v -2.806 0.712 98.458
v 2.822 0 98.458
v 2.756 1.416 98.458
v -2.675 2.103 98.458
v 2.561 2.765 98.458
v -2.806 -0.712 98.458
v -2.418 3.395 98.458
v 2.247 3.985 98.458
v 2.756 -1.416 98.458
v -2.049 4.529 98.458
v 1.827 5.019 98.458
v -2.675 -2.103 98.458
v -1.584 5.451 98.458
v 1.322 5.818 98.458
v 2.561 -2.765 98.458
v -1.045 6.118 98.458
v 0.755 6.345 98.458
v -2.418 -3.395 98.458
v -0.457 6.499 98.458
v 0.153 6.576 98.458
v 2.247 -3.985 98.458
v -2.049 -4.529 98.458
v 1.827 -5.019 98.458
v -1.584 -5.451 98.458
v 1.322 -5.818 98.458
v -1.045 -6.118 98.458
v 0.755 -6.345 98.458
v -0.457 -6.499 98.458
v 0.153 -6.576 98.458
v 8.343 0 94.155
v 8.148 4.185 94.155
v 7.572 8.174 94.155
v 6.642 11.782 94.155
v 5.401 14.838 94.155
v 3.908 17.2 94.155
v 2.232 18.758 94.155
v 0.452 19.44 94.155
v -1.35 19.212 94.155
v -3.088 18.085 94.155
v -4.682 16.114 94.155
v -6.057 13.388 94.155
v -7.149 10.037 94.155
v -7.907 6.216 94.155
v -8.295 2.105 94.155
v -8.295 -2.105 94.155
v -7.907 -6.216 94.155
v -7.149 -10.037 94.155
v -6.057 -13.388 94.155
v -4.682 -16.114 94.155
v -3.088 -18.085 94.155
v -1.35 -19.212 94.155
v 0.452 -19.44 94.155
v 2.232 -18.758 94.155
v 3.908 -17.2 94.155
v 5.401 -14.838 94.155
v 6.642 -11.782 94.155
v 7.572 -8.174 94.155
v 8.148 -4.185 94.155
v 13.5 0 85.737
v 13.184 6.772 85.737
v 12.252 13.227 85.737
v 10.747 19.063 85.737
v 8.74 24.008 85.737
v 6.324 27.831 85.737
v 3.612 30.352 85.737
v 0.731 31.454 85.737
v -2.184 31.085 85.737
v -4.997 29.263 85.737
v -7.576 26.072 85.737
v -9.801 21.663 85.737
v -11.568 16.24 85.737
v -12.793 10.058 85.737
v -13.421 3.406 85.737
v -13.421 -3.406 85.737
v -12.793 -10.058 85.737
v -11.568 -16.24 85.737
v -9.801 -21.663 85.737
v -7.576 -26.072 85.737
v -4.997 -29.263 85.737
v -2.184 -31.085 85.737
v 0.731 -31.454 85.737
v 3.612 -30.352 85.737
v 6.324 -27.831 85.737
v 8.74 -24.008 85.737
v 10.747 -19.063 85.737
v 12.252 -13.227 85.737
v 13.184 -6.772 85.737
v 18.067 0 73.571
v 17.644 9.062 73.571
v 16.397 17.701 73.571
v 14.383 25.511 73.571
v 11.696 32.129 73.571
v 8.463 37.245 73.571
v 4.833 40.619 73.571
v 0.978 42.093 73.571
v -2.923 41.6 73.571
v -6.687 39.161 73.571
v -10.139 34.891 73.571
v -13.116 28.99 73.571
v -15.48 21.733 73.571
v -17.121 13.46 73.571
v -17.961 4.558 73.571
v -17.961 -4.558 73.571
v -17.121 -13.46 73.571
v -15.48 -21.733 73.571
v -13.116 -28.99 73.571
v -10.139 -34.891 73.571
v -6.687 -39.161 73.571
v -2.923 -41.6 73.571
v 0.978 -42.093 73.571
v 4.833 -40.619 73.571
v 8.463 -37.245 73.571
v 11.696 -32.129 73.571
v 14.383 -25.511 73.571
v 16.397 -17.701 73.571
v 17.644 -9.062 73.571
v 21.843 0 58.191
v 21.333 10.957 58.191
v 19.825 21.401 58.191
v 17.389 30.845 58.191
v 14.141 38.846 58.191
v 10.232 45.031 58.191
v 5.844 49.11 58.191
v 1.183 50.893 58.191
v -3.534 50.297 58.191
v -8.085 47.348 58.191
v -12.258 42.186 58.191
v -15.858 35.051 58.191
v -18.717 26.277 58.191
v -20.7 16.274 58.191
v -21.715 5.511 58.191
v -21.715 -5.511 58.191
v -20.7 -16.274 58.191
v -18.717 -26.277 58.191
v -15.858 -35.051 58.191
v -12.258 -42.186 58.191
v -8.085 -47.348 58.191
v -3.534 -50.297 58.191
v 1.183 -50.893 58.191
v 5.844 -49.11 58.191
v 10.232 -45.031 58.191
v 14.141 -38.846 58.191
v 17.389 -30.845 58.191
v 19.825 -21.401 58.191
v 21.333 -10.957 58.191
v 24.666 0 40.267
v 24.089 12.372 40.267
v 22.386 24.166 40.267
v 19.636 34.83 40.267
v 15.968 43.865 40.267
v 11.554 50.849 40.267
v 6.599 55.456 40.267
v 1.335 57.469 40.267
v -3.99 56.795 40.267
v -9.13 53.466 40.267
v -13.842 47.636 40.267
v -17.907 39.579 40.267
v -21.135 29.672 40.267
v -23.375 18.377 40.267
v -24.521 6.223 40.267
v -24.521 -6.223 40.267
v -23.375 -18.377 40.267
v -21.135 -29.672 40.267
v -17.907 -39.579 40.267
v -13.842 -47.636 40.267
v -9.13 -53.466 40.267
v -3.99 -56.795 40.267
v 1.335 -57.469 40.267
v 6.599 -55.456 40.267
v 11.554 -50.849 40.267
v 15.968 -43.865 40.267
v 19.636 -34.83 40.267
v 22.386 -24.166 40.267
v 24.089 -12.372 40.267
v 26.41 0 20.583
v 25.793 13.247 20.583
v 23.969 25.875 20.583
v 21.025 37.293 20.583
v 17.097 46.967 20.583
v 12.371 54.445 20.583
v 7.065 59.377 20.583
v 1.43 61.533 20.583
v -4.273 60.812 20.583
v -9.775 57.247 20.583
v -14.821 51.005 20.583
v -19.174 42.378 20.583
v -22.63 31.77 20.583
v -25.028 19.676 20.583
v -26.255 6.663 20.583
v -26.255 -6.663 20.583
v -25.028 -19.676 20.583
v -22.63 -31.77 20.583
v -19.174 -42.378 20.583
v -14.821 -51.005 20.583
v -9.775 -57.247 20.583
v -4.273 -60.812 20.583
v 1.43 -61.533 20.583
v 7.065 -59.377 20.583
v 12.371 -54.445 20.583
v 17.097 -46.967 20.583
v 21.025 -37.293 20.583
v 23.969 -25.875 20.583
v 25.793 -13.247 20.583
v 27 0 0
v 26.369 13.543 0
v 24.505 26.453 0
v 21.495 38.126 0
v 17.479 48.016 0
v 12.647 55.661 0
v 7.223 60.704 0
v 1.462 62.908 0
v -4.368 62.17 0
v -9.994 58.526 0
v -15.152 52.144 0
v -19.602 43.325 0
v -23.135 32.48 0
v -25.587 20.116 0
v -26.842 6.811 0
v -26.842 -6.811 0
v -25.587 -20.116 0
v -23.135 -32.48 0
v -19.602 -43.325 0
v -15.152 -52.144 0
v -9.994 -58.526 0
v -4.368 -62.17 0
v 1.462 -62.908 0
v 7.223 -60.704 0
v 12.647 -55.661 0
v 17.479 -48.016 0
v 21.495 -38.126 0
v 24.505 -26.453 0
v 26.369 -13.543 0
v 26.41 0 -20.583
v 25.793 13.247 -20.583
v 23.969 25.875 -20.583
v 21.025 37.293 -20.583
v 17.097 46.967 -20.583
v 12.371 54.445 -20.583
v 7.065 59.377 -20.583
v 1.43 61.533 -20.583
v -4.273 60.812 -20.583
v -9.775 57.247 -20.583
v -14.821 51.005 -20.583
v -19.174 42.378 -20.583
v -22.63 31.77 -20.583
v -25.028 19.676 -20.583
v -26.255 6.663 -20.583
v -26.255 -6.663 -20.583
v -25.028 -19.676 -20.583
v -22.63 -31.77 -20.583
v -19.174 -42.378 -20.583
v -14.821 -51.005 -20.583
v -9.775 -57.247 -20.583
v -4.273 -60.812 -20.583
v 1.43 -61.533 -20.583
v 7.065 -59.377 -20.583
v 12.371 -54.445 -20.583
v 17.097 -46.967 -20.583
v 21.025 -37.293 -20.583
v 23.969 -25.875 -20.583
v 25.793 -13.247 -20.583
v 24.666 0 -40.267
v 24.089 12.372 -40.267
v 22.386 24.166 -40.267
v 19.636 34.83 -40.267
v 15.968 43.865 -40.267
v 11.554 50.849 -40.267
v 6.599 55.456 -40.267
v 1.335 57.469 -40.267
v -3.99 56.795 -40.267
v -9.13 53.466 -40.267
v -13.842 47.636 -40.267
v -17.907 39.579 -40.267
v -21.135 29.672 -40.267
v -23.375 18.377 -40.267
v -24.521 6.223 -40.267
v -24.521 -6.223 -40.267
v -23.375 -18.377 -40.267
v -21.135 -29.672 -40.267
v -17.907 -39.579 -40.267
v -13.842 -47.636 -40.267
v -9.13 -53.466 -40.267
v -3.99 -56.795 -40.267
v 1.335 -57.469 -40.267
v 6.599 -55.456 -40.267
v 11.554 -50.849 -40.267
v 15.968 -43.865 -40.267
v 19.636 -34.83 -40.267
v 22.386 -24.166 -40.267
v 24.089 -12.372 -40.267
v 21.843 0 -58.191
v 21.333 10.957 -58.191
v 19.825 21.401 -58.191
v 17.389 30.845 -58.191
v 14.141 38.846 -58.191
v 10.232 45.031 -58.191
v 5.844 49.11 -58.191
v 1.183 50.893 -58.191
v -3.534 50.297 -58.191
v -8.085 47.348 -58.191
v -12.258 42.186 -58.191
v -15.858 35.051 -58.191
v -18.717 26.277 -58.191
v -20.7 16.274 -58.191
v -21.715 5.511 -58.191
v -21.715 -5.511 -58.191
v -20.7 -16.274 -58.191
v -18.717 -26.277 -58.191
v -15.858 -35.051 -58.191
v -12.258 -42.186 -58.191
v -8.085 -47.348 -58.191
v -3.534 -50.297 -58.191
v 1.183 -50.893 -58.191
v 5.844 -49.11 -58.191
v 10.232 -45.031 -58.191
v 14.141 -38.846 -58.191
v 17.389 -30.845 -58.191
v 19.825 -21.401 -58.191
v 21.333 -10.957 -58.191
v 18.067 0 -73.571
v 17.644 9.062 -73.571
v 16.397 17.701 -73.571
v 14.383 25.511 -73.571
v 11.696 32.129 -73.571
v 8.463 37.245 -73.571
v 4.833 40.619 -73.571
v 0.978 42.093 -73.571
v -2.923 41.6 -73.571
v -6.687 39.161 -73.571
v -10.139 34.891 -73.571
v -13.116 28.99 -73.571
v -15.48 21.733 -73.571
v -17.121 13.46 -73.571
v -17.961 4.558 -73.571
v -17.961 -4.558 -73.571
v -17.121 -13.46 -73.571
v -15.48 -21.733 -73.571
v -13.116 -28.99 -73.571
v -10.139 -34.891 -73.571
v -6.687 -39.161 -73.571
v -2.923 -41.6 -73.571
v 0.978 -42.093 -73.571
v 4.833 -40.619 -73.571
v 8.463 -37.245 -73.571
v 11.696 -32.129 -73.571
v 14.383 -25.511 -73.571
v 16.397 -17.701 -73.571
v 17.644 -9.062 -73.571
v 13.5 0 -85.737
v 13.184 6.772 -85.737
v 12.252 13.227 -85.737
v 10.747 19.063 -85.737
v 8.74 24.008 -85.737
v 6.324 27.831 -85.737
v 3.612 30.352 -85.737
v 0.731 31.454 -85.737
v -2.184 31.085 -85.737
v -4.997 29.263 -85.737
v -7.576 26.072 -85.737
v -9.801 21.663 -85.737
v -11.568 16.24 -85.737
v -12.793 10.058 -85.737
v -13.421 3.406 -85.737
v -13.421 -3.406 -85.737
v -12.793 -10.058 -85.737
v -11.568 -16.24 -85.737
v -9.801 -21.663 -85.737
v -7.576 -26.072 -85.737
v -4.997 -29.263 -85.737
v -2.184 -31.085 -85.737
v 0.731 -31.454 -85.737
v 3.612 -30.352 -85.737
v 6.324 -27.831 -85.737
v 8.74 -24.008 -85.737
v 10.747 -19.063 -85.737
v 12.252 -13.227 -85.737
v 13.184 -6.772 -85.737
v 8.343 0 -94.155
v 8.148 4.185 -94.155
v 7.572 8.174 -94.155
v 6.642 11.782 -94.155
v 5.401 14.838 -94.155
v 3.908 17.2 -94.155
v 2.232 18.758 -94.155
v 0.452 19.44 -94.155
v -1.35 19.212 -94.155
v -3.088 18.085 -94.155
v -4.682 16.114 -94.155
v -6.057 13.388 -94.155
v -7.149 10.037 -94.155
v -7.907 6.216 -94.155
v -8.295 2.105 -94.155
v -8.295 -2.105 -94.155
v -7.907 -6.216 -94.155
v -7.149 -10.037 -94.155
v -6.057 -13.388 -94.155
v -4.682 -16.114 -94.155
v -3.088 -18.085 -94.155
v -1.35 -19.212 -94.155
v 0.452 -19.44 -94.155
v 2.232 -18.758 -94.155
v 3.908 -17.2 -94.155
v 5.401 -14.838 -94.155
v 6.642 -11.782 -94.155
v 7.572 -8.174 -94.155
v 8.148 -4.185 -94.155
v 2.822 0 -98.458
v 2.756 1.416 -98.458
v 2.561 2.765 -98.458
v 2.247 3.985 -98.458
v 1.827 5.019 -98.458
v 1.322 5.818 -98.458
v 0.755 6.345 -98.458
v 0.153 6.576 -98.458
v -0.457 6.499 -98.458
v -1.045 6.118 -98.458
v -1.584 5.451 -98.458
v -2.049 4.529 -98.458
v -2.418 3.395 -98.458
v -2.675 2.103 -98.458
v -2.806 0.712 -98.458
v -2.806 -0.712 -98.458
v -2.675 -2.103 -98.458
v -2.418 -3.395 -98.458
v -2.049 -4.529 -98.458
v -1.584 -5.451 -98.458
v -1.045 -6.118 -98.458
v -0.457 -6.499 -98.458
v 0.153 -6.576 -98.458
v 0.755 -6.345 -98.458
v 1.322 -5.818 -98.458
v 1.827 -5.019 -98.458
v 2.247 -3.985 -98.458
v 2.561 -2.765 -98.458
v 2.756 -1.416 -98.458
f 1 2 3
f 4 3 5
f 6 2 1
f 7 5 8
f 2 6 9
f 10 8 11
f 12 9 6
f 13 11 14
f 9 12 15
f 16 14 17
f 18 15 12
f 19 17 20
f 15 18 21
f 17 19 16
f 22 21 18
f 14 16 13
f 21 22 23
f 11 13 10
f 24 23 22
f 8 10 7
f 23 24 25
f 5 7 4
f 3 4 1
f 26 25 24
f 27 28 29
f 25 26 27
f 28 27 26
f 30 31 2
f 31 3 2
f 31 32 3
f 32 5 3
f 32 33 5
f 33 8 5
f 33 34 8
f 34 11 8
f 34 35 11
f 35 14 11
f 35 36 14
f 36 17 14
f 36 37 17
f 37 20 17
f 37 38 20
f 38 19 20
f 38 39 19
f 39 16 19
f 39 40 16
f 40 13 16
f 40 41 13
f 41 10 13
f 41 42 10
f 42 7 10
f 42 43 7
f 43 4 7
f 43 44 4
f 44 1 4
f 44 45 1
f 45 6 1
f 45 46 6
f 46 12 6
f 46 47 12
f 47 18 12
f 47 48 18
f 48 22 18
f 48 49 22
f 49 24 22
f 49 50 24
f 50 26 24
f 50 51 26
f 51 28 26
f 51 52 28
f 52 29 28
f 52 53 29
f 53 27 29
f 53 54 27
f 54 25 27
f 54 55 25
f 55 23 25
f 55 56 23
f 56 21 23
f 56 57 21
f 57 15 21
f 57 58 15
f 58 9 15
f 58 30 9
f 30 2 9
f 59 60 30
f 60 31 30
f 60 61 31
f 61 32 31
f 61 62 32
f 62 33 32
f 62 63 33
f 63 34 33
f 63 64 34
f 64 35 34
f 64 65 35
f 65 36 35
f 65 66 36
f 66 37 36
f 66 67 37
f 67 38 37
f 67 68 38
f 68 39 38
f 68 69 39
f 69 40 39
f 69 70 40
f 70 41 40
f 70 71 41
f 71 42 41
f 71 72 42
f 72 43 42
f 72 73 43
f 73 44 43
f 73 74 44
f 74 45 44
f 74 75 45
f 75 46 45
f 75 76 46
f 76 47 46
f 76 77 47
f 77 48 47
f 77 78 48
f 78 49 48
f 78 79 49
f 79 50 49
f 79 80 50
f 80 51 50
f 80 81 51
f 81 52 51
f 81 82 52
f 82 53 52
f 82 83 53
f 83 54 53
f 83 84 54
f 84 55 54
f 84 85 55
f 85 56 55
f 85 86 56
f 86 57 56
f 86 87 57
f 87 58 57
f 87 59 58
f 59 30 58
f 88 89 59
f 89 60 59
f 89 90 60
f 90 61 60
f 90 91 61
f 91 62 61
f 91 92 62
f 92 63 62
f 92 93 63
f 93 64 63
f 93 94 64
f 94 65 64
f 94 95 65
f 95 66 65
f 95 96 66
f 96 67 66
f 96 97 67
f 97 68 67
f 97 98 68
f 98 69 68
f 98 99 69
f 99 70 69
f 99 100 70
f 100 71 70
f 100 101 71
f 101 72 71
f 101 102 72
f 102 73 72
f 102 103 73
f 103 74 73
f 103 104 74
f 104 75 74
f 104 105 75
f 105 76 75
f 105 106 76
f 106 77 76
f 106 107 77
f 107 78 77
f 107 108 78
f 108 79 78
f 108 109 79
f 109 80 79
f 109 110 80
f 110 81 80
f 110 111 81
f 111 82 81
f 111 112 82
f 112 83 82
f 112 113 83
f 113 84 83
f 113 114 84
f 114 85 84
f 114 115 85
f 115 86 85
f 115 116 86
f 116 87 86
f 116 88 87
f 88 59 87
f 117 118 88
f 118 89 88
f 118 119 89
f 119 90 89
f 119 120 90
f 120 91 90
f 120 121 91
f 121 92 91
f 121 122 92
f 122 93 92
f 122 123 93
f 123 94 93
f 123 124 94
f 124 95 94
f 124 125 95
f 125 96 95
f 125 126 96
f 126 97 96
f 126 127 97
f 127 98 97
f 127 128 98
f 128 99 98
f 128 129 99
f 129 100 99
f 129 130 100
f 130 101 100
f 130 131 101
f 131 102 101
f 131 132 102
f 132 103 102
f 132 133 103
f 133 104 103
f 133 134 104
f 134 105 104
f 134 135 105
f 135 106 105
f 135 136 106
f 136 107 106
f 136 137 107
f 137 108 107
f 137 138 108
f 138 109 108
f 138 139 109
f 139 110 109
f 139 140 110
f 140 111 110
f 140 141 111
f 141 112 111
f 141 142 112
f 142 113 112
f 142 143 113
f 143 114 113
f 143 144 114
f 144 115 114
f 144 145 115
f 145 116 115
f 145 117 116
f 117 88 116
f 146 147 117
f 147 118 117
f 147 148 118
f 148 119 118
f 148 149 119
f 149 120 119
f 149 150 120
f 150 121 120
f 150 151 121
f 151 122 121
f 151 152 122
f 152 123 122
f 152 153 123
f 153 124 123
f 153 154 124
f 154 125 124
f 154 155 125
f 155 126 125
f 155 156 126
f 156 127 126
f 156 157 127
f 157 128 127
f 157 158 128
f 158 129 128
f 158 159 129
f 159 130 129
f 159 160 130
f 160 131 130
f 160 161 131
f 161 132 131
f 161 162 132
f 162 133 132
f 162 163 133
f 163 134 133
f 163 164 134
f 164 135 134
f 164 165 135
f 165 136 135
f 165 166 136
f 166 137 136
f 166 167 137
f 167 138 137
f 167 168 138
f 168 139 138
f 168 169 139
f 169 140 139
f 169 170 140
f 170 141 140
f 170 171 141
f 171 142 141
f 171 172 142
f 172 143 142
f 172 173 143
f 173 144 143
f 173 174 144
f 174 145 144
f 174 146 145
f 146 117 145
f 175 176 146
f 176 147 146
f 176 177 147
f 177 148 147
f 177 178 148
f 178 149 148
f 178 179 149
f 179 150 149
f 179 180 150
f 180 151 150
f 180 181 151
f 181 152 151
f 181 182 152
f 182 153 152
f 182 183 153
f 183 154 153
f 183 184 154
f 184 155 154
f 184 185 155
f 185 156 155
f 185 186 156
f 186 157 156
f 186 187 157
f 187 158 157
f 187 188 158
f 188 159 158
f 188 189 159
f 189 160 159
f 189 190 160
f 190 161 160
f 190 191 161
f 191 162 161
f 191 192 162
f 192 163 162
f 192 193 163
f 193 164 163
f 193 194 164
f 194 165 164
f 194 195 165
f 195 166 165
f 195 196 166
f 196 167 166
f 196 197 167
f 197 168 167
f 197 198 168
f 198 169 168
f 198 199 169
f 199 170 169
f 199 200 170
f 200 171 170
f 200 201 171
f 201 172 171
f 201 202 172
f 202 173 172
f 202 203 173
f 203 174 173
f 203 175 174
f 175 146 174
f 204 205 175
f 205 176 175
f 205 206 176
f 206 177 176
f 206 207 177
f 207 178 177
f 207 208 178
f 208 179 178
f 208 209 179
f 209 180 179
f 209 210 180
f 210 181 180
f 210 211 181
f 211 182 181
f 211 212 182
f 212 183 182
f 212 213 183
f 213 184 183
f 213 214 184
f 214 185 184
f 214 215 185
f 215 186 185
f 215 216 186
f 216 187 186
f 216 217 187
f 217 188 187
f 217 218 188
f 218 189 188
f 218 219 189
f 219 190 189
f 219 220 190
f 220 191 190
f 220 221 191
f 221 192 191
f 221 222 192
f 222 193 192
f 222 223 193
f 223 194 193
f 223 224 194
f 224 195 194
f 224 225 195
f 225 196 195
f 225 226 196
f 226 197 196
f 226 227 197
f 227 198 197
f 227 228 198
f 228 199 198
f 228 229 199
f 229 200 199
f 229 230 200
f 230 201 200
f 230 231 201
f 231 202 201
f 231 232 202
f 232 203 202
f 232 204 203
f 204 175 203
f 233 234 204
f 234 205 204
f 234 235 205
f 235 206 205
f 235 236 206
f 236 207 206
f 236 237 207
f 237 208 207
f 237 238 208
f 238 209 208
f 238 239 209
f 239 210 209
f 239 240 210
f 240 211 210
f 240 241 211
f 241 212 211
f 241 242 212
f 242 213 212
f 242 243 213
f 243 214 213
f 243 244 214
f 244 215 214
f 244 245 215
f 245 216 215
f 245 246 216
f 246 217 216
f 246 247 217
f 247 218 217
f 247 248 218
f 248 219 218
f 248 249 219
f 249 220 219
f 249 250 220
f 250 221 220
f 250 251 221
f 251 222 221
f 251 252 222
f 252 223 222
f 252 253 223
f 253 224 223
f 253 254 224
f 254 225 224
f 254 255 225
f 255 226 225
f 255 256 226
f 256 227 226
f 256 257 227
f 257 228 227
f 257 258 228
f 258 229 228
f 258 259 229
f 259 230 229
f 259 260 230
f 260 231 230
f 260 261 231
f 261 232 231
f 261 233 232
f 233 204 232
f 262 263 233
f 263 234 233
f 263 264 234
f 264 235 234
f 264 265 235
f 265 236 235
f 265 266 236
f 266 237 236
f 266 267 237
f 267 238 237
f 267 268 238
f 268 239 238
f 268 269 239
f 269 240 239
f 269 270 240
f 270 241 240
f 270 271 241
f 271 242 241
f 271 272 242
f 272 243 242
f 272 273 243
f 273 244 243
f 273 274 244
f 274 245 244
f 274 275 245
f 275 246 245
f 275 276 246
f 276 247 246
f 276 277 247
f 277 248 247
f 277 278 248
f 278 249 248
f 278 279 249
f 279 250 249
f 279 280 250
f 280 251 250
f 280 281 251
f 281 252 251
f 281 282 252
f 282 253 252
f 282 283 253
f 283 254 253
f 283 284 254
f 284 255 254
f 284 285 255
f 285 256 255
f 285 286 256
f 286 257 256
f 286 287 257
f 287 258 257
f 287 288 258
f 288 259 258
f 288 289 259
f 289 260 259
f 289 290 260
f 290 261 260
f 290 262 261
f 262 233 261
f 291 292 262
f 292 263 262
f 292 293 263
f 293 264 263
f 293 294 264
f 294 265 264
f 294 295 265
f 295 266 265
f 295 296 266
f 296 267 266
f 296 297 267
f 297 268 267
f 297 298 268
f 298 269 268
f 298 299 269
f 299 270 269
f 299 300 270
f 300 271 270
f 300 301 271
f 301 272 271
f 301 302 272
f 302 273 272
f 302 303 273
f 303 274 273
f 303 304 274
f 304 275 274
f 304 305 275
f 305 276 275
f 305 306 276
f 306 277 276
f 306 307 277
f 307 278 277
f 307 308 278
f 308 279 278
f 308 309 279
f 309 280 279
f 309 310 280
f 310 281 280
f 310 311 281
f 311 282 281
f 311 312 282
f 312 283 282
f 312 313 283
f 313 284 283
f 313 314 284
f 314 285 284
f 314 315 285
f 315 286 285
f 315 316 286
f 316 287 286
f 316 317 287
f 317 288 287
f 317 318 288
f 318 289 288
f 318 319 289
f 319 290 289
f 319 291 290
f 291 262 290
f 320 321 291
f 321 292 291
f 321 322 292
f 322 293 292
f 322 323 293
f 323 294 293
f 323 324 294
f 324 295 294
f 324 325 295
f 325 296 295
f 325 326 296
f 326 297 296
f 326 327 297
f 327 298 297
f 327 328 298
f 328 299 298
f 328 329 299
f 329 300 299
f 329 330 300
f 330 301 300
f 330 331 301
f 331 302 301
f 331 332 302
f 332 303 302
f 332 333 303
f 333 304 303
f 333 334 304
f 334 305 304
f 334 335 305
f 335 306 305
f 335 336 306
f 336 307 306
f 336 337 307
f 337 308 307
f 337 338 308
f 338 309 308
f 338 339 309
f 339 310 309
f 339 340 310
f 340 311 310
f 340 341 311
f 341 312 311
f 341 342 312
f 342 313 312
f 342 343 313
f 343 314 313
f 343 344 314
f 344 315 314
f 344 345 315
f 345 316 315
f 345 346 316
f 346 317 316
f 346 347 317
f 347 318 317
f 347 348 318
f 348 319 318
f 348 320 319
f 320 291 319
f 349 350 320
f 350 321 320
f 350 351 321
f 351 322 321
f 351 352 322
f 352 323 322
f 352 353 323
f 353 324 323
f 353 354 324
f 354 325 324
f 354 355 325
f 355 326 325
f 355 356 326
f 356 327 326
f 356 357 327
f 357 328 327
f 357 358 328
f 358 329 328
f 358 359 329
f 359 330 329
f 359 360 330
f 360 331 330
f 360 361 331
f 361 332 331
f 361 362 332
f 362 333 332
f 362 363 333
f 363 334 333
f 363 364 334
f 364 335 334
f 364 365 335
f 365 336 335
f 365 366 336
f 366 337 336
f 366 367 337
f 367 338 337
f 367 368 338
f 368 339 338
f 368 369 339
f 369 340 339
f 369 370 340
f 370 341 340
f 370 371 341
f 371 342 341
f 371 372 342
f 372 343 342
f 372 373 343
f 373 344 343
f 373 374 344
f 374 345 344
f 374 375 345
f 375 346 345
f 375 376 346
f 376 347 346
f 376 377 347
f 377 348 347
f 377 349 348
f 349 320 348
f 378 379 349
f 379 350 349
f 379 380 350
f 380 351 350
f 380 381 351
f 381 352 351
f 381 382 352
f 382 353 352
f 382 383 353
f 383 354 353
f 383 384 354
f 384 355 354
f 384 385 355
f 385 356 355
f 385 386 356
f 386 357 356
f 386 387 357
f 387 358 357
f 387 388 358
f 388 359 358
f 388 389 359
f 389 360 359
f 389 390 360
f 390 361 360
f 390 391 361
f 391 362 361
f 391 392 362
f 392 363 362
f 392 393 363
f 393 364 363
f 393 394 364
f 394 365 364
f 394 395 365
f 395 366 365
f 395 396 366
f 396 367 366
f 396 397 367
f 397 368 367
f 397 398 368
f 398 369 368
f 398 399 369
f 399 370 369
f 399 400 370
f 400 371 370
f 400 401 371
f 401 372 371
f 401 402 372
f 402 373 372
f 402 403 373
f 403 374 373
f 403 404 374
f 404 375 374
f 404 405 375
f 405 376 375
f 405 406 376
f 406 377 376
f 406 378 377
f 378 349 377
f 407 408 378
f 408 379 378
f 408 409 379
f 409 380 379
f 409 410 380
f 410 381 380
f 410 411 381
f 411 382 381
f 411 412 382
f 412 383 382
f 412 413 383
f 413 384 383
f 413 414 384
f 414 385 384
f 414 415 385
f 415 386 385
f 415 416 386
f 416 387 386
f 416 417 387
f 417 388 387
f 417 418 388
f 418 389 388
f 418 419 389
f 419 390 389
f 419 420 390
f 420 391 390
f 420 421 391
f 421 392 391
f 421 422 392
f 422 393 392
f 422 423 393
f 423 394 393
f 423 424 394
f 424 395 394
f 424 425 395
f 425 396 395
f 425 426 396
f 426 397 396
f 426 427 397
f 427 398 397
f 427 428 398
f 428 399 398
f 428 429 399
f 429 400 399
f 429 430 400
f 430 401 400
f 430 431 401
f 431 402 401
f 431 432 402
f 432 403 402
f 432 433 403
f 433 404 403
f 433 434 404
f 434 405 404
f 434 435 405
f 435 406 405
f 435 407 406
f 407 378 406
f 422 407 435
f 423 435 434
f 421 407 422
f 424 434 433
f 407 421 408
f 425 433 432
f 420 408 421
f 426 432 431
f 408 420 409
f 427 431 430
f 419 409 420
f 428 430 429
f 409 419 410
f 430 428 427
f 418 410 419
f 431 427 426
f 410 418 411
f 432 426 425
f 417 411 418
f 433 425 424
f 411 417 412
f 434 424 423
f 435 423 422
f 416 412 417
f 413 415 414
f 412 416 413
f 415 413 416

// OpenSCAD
// Generated by SolidPython 1.0.1 on 2020-07-29 00:46:45


scale(v = [3, 7, 11]) {
	sphere(r = 9);
}
/***********************************************
*********      SolidPython code:      **********
************************************************
 
# import packages: SolidPython
from solid import *
from solid.utils import *
from itertools import chain, combinations, permutations


class Resize:

    def __init__(self, scad_file):
        self.scad_file = scad_file
        #self.scad_file = import_scad(scad_file)
        # cone/cylinder param:
        self.r1 = 0
        self.r2 = 0
        self.h = 0
        # rectangular prism param:
        self.w = 0
        self.l = 0
        # ellipse param:
        self.r = 0

    # import OpenScad code (file name corresponds to shape)


    # classify shape + parameters
    def assign(self, param1, param2, param3):
        if self.scad_file == 'cone.scad':
            self.r1 = param1
            self.r2 = param2
            self.h = param3
        elif self.scad_file == 'cylinder.scad':
            self.r1 = param1
            self.r2 = param2
            self.h = param3
        elif self.scad_file == 'rectangularPrism.scad':
            self.h = param1
            self.l = param2
            self.w = param3
        else:
            self.r = param1
            self.h = param2

    # resize parameters
    def iterate(self):
        x = range(3, 20, 2)
        i = 1
        if self.scad_file == 'cone.scad':
            tempList = list(permutations(x, 2))
            for temp in tempList:
                param1 = temp[0]
                param2 = temp[1]
                filepath = 'produced_scad_files/' + 'cone' + str(param1) + '_' + str(param2) + '_' + '.scad'
                scad_render_to_file(cylinder(h=param1, r1=param2, r2=0), filepath)

        elif self.scad_file == 'cylinder.scad':
            tempList = list(permutations(x, 3))
            for temp in tempList:
                param1 = temp[0]
                param2 = temp[1]
                filepath = 'produced_scad_files/' + 'cylinder' + str(param1) + '_' + str(param2) + '_' + '.scad'
                scad_render_to_file(cylinder(h=param1, r1=param2, r2=param2), filepath)

        elif self.scad_file == 'rectangularPrism.scad':
            tempList = list(permutations(x, 3))
            for temp in tempList:
                param1 = temp[0]
                param2 = temp[1]
                param3 = temp[2]
                filepath = 'produced_scad_files/' + 'rectangularPrism' + str(param1) + '_' + str(param2) + '_' + str(
                    param3) + '.scad'
                scad_render_to_file(cube(size=(param1, param2, param3)), filepath)

        elif self.scad_file == 'ellipse.scad':
            tempList = list(permutations(x, 4))
            for temp in tempList:
                param1 = temp[0]
                param2 = temp[1]
                param3 = temp[2]
                param4 = temp[3]
                filepath = 'produced_scad_files/' + 'ellipse' + str(param1) + '_' + str(param2) + '_' + str(param3) + '_' + str(param4) + '.scad'
                scad_render_to_file(scale([param1, param2, param3])(sphere(r=param4)), filepath)

    def render_to_scadfile(self):
        scad_render_to_file(scad, 'example.scad') 
 
************************************************/
